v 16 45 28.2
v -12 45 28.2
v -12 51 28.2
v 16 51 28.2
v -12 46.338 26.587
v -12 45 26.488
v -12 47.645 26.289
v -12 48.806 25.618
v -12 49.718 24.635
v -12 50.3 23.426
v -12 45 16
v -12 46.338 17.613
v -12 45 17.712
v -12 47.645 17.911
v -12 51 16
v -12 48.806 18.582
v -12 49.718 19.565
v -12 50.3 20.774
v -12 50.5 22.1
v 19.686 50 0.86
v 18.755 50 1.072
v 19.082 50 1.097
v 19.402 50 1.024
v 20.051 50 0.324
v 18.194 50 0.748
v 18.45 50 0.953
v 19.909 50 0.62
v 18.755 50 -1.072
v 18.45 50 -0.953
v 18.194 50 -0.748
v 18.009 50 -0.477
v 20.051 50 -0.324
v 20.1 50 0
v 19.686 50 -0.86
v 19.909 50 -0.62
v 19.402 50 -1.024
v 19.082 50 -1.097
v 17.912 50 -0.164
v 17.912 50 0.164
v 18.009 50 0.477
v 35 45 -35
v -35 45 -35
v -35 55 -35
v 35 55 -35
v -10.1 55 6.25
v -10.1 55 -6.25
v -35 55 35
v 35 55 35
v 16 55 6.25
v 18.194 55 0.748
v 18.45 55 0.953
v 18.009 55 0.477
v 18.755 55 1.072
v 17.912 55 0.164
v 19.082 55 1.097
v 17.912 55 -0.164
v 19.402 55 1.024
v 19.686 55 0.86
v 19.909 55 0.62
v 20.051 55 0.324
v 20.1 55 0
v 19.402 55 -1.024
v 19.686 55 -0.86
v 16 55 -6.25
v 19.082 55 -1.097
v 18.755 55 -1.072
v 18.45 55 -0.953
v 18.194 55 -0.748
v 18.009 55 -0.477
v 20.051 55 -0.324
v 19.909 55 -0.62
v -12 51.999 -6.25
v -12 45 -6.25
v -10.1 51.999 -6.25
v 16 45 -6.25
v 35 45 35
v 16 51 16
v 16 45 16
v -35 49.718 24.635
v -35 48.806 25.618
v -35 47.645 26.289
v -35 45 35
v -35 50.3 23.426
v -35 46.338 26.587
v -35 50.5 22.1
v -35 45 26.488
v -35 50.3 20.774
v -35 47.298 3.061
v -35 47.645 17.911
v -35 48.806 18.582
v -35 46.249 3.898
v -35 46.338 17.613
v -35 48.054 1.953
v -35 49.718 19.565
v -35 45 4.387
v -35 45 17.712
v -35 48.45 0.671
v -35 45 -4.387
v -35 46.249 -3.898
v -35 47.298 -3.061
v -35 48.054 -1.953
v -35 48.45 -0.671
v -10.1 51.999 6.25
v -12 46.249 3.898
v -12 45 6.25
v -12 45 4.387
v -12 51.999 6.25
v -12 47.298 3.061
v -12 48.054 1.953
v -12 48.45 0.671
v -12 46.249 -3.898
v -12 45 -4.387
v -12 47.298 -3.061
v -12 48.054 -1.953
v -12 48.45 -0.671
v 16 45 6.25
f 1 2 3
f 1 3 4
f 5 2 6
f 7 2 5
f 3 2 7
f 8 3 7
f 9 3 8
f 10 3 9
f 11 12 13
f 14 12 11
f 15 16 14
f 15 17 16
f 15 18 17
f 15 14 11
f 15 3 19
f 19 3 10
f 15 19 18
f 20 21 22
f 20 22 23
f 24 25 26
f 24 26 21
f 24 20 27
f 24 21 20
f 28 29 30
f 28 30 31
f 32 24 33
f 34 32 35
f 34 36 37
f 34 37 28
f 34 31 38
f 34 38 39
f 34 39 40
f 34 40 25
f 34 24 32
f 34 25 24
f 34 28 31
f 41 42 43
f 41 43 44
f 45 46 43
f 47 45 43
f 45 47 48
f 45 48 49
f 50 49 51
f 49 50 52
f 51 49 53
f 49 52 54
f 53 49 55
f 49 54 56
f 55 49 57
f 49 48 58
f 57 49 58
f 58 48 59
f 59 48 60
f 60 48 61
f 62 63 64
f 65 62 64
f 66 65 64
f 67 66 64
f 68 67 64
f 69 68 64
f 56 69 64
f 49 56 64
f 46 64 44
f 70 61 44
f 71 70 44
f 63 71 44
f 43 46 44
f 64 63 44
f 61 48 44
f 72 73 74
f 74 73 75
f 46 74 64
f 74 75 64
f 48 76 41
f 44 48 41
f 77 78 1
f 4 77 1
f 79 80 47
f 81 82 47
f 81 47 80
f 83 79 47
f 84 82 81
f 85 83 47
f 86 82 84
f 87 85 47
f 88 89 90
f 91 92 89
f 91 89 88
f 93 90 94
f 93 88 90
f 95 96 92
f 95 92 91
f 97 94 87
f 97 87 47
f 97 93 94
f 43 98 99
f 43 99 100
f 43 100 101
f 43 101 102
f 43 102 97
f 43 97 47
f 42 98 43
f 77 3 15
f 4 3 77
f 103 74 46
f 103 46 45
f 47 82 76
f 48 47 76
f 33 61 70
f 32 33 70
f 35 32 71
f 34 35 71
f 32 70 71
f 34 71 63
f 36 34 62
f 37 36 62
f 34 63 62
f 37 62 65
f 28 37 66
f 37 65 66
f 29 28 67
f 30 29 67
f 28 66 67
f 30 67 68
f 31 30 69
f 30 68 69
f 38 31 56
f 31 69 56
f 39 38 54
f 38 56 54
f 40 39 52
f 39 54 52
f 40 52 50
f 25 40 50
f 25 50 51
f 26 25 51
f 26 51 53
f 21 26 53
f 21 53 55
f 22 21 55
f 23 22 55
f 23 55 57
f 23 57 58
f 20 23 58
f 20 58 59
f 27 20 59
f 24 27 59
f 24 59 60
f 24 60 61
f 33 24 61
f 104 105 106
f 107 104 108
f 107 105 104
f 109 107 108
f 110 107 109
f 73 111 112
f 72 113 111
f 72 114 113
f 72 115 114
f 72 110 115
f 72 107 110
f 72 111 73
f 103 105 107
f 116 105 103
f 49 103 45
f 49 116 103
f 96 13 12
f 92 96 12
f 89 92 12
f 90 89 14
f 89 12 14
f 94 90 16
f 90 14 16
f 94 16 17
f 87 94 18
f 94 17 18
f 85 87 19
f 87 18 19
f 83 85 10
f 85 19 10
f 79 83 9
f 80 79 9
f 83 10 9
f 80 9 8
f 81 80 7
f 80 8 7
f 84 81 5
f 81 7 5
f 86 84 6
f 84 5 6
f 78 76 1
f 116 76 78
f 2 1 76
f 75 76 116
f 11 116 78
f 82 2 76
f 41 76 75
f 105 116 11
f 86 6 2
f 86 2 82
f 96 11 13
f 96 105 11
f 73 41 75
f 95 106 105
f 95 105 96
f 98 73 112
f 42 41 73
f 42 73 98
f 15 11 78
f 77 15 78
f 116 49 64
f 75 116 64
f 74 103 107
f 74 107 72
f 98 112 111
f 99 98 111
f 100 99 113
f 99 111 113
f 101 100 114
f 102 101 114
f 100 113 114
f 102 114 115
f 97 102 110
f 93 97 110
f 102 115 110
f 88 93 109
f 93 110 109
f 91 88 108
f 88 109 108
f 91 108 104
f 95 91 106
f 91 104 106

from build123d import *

# Parameters (mm, degrees)
CROQUIS1_W              = 64
CROQUIS1_H              = 64
SALIENTE_EXTRUIR1_DEPTH = 60
CROQUIS2_W              = 70
CROQUIS2_H              = 70
CROQUIS2_W_2            = 64
CROQUIS2_H_2            = 64
SALIENTE_EXTRUIR2_DEPTH = 64
CORTAR_EXTRUIR1_DEPTH   = 21
CROQUIS5_R              = 1.1
CORTAR_EXTRUIR2_DEPTH   = 10
CORTAR_EXTRUIR3_REACH   = 30
CROQUIS10_R             = 4.5
CROQUIS11_W             = 70
CROQUIS11_H             = 70
CORTAR_EXTRUIR4_DEPTH   = 30
CROQUIS12_W             = 23
CROQUIS12_H             = 12.2
CORTAR_EXTRUIR5_DEPTH   = 21
CORTAR_EXTRUIR6_REACH   = 30
CROQUIS13_R             = 4.5
CROQUIS14_R             = 1.1
CORTAR_EXTRUIR7_DEPTH   = 10
CROQUIS15_R             = 3.7
CORTAR_EXTRUIR8_DEPTH   = 10
CROQUIS16_W             = 64
CROQUIS16_H             = 64
CORTAR_EXTRUIR9_DEPTH   = 5
CROQUIS17_W             = 12.5
CROQUIS17_H             = 12.998685397
CORTAR_EXTRUIR10_DEPTH  = 5
CORTAR_EXTRUIR11_REACH  = 72
CROQUIS18_W             = 70
CROQUIS18_H             = 9
CROQUIS18_H_2           = 5.000169364
CORTAR_EXTRUIR13_DEPTH  = 5
CORTAR_EXTRUIR14_REACH  = 12
CROQUIS21_W             = 81.467019472
CROQUIS21_H             = 81.467019472
CORTAR_EXTRUIR16_REACH  = 5.001
CROQUIS23_W             = 3.1
CROQUIS23_H             = 12.5


with BuildPart() as part:
    # Croquis1 → Saliente-Extruir1 (new body)
    with BuildSketch(Plane(origin=(0, 0, 0), x_dir=(1, 0, 0), z_dir=(0, 1, 0))):
        Rectangle(CROQUIS1_W, CROQUIS1_H)
    extrude(amount=SALIENTE_EXTRUIR1_DEPTH)

    # Croquis2 → Saliente-Extruir2 (add)
    with BuildSketch(Plane(origin=(0, 0, 0), x_dir=(1, 0, 0), z_dir=(0, 1, 0))):
        Rectangle(CROQUIS2_W, CROQUIS2_H)
        Rectangle(CROQUIS2_W_2, CROQUIS2_H_2, mode=Mode.SUBTRACT)
    extrude(amount=SALIENTE_EXTRUIR2_DEPTH)

    # Croquis4 → Cortar-Extruir1 (cut)
    with BuildSketch(Plane(origin=(0, 60, 0), x_dir=(1, 0, 0), z_dir=(0, 1, 0))):
        Polygon((-7, 6), (-7, -6), (-7, -6.25), (16, -6.25), (16, -6), (16, 6), (16, 6.25), (-7, 6.25), align=None)
    extrude(amount=-CORTAR_EXTRUIR1_DEPTH, mode=Mode.SUBTRACT)

    # Croquis5 → Cortar-Extruir2 (cut)
    with BuildSketch(Plane(origin=(0, 60, 0), x_dir=(1, 0, 0), z_dir=(0, 1, 0))):
        with Locations((19, 0)):
            Circle(CROQUIS5_R)
        with Locations((-9, 0)):
            Circle(CROQUIS5_R)
    extrude(amount=-CORTAR_EXTRUIR2_DEPTH, mode=Mode.SUBTRACT)

    # Croquis10 → Cortar-Extruir3 (cut, up to next)
    with BuildSketch(Plane(origin=(-7, 0, 0), x_dir=(0, 0, -1), z_dir=(1, 0, 0)), mode=Mode.PRIVATE) as cortar_extruir3_sk1:
        with Locations((0, 44)):
            Circle(CROQUIS10_R)
    cortar_extruir3_tool1 = extrude(cortar_extruir3_sk1.sketch, amount=-CORTAR_EXTRUIR3_REACH, mode=Mode.PRIVATE) & part.part
    add(cortar_extruir3_tool1.solids().sort_by_distance((-7, 44, 0))[0], mode=Mode.SUBTRACT)

    # Croquis11 → Cortar-Extruir4 (cut)
    with BuildSketch(Plane.XZ):
        Rectangle(CROQUIS11_W, CROQUIS11_H)
    extrude(amount=-CORTAR_EXTRUIR4_DEPTH, mode=Mode.SUBTRACT)

    # Croquis12 → Cortar-Extruir5 (cut)
    with BuildSketch(Plane.XZ.offset(-30)):
        with Locations((4.5, 22.1)):
            Rectangle(CROQUIS12_W, CROQUIS12_H)
    extrude(amount=-CORTAR_EXTRUIR5_DEPTH, mode=Mode.SUBTRACT)

    # Croquis13 → Cortar-Extruir6 (cut, up to next)
    with BuildSketch(Plane(origin=(-7, 0, 0), x_dir=(0, 0, -1), z_dir=(1, 0, 0)), mode=Mode.PRIVATE) as cortar_extruir6_sk1:
        with Locations((-22.1, 46)):
            Circle(CROQUIS13_R)
    cortar_extruir6_tool1 = extrude(cortar_extruir6_sk1.sketch, amount=-CORTAR_EXTRUIR6_REACH, mode=Mode.PRIVATE) & part.part
    add(cortar_extruir6_tool1.solids().sort_by_distance((-7, 46, 22.1))[0], mode=Mode.SUBTRACT)

    # Croquis14 → Cortar-Extruir7 (cut)
    with BuildSketch(Plane.XZ.offset(-30)):
        with Locations((19, 22.1)):
            Circle(CROQUIS14_R)
        with Locations((-9, 22.1)):
            Circle(CROQUIS14_R)
    extrude(amount=-CORTAR_EXTRUIR7_DEPTH, mode=Mode.SUBTRACT)

    # Croquis15 → Cortar-Extruir8 (cut)
    with BuildSketch(Plane.XZ.offset(-30)):
        with Locations((0, -22.1)):
            Circle(CROQUIS15_R)
    extrude(amount=-CORTAR_EXTRUIR8_DEPTH, mode=Mode.SUBTRACT)

    # Croquis16 → Cortar-Extruir9 (cut)
    with BuildSketch(Plane(origin=(0, 60, 0), x_dir=(1, 0, 0), z_dir=(0, 1, 0))):
        Rectangle(CROQUIS16_W, CROQUIS16_H)
    extrude(amount=-CORTAR_EXTRUIR9_DEPTH, mode=Mode.SUBTRACT)

    # Croquis17 → Cortar-Extruir10 (cut)
    with BuildSketch(Plane(origin=(-7, 0, 0), x_dir=(0, 0, -1), z_dir=(1, 0, 0))):
        with Locations((0, 45.499342699)):
            Rectangle(CROQUIS17_W, CROQUIS17_H)
    extrude(amount=-CORTAR_EXTRUIR10_DEPTH, mode=Mode.SUBTRACT)

    # Croquis18 → Cortar-Extruir11 (cut, up to next)
    with BuildSketch(Plane(origin=(35, 0, 0), x_dir=(0, 0, -1), z_dir=(1, 0, 0)), mode=Mode.PRIVATE) as cortar_extruir11_sk1:
        with Locations((0, 59.5)):
            Rectangle(CROQUIS18_W, CROQUIS18_H)
    cortar_extruir11_tool1 = extrude(cortar_extruir11_sk1.sketch, amount=-CORTAR_EXTRUIR11_REACH, mode=Mode.PRIVATE) & part.part
    add(cortar_extruir11_tool1.solids().sort_by_distance((35, 59.5, 0))[0], mode=Mode.SUBTRACT)
    # Croquis18 → Cortar-Extruir11 (cut, up to next)
    with BuildSketch(Plane(origin=(35, 0, 0), x_dir=(0, 0, -1), z_dir=(1, 0, 0)), mode=Mode.PRIVATE) as cortar_extruir11_sk2:
        with Locations((0, 32.500084682)):
            Rectangle(CROQUIS18_W, CROQUIS18_H_2)
    cortar_extruir11_tool2 = extrude(cortar_extruir11_sk2.sketch, amount=-CORTAR_EXTRUIR11_REACH, mode=Mode.PRIVATE) & part.part
    add(cortar_extruir11_tool2.solids().sort_by_distance((35, 32.500085, 0))[0], mode=Mode.SUBTRACT)

    # Croquis19 → Cortar-Extruir13 (cut)
    with BuildSketch(Plane(origin=(-7, 0, 0), x_dir=(0, 0, -1), z_dir=(1, 0, 0))):
        Polygon((-16, 51), (-28.2, 51), (-28.2, 38.000169364), (-22.1, 38.000169364), (-16, 38.000169364), align=None)
    extrude(amount=-CORTAR_EXTRUIR13_DEPTH, mode=Mode.SUBTRACT)

    # Croquis21 → Cortar-Extruir14 (cut, up to next)
    with BuildSketch(Plane(origin=(0, 45.000169364, 0), x_dir=(-1, 0, 0), z_dir=(0, -1, 0)), mode=Mode.PRIVATE) as cortar_extruir14_sk1:
        with Locations((0.076423095, -0.764230952)):
            Rectangle(CROQUIS21_W, CROQUIS21_H)
    cortar_extruir14_tool1 = extrude(cortar_extruir14_sk1.sketch, amount=CORTAR_EXTRUIR14_REACH, mode=Mode.PRIVATE) & part.part
    add(cortar_extruir14_tool1.solids().sort_by_distance((-0.076423, 45.000169, 0.764231))[0], mode=Mode.SUBTRACT)

    # Croquis23 → Cortar-Extruir16 (cut, up to next)
    with BuildSketch(Plane.XZ.offset(-51.998685397), mode=Mode.PRIVATE) as cortar_extruir16_sk1:
        with Locations((-8.55, 0)):
            Rectangle(CROQUIS23_W, CROQUIS23_H)
    cortar_extruir16_tool1 = extrude(cortar_extruir16_sk1.sketch, amount=-CORTAR_EXTRUIR16_REACH, mode=Mode.PRIVATE) & part.part
    add(cortar_extruir16_tool1.solids().sort_by_distance((-8.55, 51.998685, 0))[0], mode=Mode.SUBTRACT)


solid = part.part
